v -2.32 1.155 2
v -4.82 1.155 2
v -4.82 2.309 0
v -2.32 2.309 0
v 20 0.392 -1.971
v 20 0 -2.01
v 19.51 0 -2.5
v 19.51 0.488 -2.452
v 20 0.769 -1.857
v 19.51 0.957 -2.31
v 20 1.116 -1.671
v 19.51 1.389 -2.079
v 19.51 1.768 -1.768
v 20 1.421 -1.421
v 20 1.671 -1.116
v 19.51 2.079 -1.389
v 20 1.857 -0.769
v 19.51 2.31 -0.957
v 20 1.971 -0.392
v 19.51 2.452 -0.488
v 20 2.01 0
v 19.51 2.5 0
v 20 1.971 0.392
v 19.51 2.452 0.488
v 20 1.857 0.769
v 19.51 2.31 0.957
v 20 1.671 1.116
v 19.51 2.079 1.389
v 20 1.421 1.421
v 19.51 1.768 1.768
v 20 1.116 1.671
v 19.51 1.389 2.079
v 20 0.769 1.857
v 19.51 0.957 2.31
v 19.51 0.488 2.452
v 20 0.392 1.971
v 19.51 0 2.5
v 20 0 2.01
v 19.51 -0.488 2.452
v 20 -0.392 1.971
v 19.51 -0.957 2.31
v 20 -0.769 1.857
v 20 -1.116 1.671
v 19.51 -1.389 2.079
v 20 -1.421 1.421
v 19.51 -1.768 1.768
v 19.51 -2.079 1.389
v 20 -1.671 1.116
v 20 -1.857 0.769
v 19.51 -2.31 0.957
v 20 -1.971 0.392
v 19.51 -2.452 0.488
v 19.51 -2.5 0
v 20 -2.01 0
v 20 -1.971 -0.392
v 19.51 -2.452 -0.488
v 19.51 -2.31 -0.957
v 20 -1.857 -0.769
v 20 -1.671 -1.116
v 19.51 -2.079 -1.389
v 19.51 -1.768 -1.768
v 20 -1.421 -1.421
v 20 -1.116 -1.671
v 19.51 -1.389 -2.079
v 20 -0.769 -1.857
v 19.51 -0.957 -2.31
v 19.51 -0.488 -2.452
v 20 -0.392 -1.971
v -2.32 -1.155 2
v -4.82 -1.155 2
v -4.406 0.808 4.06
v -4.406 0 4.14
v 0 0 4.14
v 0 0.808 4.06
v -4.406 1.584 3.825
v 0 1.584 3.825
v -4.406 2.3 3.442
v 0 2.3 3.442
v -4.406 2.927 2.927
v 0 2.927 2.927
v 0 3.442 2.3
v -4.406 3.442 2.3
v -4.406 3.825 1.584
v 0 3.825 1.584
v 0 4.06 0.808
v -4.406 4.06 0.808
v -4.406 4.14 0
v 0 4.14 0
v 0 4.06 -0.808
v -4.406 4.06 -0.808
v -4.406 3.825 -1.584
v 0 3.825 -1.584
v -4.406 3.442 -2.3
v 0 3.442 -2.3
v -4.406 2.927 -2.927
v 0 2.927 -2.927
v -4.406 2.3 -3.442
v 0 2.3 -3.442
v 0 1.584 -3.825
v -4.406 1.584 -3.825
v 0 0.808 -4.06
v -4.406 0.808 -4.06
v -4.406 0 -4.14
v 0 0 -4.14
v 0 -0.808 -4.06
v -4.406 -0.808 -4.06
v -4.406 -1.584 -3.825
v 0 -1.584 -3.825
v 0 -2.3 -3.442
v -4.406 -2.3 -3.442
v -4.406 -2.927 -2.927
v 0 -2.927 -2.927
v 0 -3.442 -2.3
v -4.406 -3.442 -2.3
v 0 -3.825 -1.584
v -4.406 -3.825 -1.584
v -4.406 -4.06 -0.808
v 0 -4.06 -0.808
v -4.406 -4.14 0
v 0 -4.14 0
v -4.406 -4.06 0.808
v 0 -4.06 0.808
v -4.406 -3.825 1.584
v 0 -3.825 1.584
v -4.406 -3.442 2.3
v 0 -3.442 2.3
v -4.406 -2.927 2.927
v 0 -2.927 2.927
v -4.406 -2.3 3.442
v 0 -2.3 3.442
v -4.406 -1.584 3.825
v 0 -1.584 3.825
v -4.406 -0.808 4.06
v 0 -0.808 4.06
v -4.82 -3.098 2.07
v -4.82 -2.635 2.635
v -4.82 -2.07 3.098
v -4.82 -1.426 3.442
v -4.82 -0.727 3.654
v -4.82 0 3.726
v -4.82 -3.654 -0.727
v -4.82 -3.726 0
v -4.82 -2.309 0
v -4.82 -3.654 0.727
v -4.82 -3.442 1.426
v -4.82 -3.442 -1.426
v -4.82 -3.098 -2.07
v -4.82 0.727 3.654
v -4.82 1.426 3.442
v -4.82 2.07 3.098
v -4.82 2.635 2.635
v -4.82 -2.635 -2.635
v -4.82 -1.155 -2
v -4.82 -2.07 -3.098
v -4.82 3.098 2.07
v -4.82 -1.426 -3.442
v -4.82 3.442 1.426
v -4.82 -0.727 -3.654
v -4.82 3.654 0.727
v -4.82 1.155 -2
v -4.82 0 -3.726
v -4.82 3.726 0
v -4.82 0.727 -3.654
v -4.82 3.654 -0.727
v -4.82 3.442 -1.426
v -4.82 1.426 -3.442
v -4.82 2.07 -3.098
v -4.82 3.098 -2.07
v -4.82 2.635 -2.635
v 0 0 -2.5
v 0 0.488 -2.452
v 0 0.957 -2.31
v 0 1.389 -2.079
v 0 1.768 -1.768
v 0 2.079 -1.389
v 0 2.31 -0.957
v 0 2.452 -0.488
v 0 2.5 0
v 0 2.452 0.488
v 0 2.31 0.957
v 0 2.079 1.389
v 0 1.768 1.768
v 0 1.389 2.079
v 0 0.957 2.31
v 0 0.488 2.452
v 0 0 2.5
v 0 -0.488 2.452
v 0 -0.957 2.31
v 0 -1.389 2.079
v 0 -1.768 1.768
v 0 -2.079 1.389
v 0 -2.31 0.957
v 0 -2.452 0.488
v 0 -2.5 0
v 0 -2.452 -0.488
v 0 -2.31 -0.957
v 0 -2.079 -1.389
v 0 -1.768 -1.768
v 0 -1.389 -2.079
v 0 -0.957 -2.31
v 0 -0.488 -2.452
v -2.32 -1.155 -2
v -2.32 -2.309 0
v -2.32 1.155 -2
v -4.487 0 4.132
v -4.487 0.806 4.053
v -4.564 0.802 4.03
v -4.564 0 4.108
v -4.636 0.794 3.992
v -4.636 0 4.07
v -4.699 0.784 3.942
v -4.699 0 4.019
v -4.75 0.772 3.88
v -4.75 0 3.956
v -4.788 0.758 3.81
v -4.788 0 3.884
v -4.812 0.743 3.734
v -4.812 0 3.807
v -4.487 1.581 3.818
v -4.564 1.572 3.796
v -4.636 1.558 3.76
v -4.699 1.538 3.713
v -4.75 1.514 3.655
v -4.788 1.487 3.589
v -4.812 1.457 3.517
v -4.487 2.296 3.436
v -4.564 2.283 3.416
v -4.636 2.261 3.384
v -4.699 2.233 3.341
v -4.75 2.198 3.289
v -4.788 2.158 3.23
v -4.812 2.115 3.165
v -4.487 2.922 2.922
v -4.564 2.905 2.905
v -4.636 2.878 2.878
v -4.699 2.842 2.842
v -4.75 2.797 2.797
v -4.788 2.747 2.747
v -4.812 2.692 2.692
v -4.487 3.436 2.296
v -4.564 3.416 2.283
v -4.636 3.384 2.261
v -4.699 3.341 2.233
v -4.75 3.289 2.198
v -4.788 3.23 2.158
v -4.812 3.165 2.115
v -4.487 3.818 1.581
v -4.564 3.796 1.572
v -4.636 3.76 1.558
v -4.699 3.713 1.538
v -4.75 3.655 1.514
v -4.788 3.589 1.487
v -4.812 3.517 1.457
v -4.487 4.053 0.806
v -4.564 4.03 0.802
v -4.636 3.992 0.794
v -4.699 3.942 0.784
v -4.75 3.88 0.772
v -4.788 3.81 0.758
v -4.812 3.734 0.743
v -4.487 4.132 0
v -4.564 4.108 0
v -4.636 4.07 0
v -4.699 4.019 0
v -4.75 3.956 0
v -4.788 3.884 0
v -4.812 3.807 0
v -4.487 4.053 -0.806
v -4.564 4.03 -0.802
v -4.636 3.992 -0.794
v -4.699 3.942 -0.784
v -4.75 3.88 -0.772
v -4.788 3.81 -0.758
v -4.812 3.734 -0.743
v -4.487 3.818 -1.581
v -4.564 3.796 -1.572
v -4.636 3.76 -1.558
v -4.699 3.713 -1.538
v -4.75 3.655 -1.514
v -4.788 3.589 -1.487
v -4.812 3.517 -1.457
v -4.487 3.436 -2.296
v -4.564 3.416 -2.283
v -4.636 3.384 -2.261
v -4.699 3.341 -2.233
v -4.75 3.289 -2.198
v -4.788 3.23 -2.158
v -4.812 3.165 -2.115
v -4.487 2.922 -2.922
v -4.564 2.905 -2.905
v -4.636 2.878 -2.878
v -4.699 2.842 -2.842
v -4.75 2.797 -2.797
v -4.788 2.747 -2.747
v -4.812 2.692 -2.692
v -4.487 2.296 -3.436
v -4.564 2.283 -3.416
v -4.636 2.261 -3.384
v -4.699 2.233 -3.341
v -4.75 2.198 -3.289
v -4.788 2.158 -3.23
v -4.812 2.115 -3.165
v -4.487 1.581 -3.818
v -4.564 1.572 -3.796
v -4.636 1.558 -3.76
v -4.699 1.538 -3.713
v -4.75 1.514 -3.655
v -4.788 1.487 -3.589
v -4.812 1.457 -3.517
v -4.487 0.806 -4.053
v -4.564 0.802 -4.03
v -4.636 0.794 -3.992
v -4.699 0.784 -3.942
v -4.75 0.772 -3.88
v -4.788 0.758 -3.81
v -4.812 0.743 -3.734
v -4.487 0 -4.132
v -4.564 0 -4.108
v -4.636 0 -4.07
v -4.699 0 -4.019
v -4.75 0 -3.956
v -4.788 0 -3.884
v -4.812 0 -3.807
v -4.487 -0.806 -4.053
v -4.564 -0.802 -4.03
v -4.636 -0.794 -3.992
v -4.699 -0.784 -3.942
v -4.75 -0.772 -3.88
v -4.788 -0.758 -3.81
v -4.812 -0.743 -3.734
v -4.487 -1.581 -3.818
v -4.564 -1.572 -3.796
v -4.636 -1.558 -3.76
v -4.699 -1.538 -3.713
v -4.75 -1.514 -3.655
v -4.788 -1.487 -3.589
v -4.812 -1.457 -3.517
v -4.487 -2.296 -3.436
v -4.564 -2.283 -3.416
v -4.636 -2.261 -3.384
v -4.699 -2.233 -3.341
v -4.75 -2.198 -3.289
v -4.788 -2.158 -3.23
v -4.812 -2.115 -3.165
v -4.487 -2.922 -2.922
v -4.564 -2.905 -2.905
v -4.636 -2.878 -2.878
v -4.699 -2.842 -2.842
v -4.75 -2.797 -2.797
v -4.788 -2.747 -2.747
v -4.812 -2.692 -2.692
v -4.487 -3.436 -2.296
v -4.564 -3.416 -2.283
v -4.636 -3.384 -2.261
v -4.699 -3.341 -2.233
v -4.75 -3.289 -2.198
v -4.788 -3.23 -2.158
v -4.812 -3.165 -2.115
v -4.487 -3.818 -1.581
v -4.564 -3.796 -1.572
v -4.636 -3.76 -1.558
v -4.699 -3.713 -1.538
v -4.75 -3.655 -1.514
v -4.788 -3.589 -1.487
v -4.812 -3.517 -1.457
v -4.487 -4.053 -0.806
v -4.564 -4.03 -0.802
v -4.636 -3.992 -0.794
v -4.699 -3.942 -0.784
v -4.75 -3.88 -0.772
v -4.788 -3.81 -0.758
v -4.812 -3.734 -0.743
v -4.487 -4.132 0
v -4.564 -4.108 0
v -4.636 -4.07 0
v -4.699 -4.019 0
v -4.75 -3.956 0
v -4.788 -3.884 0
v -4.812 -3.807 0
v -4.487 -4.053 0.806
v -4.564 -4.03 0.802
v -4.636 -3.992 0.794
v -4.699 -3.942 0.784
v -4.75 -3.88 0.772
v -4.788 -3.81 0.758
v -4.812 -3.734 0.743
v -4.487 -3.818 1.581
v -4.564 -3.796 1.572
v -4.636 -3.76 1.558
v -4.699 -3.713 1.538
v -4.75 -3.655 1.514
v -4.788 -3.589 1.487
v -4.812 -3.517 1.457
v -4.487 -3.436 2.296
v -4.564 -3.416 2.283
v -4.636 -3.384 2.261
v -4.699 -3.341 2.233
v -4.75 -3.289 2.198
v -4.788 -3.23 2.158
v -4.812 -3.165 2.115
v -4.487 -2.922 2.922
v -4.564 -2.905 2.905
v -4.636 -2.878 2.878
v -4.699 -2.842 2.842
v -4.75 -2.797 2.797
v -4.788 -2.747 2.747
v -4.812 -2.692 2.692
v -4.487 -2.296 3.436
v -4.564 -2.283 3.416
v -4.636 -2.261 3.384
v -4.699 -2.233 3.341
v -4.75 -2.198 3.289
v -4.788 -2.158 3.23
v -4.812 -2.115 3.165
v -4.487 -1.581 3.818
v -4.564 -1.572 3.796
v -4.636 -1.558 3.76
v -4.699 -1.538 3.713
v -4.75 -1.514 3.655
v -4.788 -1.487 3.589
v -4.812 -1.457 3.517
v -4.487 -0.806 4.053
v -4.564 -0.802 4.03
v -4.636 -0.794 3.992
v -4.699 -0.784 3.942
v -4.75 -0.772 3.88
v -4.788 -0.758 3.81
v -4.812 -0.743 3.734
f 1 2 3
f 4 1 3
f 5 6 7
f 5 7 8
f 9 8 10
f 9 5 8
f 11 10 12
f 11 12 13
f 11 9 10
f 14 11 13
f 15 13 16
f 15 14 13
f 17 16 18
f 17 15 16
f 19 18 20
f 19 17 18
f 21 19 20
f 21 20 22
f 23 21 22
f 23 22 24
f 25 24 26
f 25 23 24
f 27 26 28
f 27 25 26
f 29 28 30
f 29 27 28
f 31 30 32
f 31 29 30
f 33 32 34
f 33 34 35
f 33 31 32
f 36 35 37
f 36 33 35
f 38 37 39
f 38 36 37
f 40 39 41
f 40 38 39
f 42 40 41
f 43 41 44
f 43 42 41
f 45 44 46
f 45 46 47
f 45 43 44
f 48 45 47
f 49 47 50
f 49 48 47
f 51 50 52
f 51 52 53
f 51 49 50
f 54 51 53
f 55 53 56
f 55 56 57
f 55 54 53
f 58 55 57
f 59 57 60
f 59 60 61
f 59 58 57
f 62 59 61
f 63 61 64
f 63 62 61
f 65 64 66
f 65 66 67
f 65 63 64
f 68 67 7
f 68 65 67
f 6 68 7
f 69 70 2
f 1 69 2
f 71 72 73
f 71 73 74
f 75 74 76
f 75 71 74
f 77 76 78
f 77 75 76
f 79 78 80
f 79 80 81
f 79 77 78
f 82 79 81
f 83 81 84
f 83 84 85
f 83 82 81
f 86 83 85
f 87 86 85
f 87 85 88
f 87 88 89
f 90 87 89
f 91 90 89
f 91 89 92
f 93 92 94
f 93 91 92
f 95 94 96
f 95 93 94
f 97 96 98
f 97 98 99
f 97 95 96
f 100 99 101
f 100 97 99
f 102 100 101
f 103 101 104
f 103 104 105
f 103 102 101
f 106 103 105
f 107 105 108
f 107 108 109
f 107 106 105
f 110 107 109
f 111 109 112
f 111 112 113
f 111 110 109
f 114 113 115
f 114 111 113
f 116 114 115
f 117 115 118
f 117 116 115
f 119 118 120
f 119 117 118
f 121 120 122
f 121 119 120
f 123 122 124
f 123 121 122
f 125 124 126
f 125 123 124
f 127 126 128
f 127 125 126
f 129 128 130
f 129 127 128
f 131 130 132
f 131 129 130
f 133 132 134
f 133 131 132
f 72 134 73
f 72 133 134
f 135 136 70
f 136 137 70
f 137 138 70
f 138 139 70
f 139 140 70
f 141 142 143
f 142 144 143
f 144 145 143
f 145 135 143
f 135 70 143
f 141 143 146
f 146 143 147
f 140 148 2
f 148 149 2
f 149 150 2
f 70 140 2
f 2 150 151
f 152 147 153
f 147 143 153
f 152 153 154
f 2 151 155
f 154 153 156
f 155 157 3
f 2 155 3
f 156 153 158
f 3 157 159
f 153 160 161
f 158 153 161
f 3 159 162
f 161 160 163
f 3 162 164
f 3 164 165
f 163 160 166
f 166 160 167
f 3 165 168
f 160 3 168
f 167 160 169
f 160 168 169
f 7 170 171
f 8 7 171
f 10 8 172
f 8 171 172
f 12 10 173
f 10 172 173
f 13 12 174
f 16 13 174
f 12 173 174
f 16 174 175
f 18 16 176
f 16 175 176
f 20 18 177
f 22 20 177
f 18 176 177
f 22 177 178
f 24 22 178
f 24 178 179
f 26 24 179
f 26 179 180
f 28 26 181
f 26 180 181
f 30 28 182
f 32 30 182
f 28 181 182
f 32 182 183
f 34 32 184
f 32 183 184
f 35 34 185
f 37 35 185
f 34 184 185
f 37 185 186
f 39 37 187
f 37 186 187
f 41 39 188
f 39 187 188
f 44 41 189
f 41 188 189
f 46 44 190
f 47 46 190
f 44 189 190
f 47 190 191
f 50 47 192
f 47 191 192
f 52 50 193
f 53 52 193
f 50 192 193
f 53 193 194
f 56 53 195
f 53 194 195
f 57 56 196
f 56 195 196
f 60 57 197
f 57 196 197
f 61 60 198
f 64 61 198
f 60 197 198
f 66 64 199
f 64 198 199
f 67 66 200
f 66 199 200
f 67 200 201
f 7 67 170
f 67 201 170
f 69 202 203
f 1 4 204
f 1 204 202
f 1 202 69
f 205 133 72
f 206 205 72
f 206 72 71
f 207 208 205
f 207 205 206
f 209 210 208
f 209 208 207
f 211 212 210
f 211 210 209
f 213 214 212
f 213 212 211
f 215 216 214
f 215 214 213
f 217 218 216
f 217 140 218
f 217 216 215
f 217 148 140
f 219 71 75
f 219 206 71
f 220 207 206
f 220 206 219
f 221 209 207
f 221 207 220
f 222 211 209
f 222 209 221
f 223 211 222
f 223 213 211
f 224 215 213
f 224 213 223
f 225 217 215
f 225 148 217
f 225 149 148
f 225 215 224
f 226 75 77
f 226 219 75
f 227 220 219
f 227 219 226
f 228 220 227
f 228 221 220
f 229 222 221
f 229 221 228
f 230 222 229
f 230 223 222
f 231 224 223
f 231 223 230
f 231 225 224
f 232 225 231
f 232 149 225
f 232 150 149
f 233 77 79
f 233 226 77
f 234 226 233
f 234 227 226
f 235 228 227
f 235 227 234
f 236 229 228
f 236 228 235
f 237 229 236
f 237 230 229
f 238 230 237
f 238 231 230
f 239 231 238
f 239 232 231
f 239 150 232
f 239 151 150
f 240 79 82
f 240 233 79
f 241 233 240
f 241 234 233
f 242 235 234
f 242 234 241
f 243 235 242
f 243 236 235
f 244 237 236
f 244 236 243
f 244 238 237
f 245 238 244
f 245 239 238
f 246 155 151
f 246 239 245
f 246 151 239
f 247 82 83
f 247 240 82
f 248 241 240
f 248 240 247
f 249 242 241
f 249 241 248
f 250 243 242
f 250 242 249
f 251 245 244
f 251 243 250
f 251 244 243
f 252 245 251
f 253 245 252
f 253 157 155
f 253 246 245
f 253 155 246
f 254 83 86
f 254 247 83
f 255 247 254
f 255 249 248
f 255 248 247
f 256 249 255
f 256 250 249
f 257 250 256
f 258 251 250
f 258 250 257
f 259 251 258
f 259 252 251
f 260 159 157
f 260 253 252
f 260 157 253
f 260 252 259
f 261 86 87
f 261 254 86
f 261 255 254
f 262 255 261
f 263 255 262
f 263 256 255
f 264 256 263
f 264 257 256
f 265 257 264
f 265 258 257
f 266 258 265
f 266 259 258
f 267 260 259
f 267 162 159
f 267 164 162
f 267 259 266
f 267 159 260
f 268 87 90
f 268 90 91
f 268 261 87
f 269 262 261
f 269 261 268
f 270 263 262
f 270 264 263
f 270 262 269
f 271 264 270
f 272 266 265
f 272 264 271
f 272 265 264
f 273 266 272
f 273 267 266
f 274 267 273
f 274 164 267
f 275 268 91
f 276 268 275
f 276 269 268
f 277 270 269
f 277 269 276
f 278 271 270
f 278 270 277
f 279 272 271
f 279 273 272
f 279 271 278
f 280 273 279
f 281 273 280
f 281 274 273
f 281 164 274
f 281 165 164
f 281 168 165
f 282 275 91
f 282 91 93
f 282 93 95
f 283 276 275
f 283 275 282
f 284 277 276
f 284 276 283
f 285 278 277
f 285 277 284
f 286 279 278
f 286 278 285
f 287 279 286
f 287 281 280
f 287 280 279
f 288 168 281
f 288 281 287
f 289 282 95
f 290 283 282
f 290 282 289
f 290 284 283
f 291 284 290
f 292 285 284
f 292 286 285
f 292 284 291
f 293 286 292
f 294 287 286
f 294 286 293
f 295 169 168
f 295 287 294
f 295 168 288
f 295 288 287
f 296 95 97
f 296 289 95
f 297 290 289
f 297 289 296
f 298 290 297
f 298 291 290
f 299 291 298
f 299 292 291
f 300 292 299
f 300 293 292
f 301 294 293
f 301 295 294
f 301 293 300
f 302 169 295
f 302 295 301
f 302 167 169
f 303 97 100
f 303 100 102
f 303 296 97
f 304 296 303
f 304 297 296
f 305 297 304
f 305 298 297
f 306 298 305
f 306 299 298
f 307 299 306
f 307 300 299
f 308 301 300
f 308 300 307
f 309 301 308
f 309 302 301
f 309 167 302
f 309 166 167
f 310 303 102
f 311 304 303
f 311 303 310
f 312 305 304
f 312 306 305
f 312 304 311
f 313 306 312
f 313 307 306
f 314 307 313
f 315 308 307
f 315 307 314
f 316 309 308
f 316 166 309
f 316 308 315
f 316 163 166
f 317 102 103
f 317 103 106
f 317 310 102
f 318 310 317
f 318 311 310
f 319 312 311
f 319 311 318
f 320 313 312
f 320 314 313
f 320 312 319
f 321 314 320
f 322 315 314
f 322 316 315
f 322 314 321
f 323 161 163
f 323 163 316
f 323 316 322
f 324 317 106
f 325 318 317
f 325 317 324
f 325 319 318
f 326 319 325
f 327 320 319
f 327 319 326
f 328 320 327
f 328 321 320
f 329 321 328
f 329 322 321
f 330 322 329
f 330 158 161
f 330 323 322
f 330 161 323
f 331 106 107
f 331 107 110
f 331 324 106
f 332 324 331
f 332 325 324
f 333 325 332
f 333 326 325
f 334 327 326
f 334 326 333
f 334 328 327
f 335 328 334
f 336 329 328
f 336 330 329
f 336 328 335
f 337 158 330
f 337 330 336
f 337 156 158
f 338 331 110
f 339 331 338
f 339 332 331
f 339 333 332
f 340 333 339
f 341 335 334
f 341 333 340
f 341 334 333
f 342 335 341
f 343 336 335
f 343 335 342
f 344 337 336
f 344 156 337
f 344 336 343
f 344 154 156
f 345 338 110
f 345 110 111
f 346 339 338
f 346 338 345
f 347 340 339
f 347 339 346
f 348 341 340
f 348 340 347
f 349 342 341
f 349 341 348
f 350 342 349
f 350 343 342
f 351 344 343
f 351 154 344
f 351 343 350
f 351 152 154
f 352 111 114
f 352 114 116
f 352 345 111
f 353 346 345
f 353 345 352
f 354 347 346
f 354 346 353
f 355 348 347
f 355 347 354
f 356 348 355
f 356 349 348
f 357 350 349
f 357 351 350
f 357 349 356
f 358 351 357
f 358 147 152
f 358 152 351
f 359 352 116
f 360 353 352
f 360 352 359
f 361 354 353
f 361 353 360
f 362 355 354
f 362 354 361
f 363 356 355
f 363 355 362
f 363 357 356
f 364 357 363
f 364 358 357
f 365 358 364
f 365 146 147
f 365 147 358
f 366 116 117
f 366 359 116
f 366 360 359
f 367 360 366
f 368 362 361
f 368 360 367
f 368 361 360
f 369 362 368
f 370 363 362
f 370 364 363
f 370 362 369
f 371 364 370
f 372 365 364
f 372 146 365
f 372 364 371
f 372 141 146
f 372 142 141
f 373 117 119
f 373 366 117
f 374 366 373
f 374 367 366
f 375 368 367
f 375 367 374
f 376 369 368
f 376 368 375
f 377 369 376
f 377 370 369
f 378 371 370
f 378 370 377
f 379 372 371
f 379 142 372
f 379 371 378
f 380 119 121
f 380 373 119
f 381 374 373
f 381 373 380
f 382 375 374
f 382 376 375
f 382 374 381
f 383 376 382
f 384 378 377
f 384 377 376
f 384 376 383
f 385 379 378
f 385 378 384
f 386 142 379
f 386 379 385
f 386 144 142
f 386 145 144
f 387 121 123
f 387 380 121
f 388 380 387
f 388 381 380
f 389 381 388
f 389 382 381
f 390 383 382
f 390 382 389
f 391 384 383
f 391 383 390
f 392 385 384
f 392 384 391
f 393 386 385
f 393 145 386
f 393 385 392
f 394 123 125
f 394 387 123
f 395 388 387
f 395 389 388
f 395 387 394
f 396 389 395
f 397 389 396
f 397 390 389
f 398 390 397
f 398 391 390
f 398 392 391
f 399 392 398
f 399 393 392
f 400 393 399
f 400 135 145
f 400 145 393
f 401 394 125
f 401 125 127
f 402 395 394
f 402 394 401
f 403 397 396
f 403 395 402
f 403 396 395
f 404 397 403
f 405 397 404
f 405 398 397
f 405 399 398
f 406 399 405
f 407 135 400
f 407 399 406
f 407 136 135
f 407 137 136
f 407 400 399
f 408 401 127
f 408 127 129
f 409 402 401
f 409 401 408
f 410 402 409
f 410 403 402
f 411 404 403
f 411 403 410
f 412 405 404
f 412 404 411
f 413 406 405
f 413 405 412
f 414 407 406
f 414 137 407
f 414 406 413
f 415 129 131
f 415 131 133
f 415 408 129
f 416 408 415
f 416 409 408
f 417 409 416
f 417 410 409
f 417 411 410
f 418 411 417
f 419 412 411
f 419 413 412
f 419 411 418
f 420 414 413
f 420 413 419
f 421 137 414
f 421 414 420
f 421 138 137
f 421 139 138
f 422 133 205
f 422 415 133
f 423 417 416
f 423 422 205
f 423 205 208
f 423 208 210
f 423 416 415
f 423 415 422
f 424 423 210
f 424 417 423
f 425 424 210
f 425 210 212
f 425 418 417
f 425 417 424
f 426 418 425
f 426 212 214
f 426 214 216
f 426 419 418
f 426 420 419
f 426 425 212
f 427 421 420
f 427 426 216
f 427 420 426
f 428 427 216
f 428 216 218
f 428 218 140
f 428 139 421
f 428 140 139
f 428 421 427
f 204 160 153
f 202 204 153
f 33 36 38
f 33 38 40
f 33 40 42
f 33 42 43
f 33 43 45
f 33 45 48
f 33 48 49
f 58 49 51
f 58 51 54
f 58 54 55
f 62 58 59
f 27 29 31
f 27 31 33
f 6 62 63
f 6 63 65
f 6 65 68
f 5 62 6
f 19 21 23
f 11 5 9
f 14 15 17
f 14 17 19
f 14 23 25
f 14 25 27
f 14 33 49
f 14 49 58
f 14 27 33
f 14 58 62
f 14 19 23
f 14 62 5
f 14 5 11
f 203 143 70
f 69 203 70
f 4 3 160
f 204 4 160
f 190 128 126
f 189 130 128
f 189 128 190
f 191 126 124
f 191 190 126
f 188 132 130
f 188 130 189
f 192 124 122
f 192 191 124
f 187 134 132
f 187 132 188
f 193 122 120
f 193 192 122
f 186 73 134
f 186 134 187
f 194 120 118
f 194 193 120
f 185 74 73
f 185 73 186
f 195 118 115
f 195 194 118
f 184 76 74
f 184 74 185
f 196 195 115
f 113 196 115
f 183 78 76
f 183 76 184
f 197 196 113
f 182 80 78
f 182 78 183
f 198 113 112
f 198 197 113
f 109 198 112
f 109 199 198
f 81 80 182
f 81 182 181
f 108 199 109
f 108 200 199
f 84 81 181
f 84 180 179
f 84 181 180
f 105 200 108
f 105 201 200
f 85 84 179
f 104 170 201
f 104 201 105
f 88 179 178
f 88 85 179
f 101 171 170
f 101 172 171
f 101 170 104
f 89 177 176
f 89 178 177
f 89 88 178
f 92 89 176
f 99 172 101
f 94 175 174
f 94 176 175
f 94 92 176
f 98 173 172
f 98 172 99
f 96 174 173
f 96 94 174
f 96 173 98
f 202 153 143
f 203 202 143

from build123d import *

# Parameters (mm, degrees)
SKETCH1_W           = 4.82
SKETCH1_H           = 4.14
SKETCH2_R           = 2.5
BOSS_EXTRUDE1_DEPTH = 20
CUT_EXTRUDE1_DEPTH  = 2.5
CHAMFER1_SIZE       = 0.4905
FILLET1_R           = 0.414


with BuildPart() as part:
    # Sketch1 → Revolve1 (revolve)
    with BuildSketch(Plane(origin=(0, 0, 0), x_dir=(-1, 0, 0), z_dir=(0, 0, -1)), mode=Mode.PRIVATE) as revolve1_sk:
        with Locations((2.41, 2.07)):
            Rectangle(SKETCH1_W, SKETCH1_H)
    revolve(revolve1_sk.sketch.rotate(Axis((0, 0, 0), (-1, 0, 0)), 270), axis=Axis((0, 0, 0), (-1, 0, 0)))

    # Sketch2 → Boss-Extrude1 (add)
    with BuildSketch(Plane(origin=(0, 0, 0), x_dir=(0, 0, -1), z_dir=(1, 0, 0))):
        Circle(SKETCH2_R)
    extrude(amount=BOSS_EXTRUDE1_DEPTH)

    # Sketch3 → Cut-Extrude1 (cut)
    with BuildSketch(Plane.ZY.offset(4.82)):
        Polygon((-2, -1.154700538), (0, -2.309401077), (2, -1.154700538), (2, 1.154700538), (0, 2.309401077), (-2, 1.154700538), align=None)
    extrude(amount=-CUT_EXTRUDE1_DEPTH, mode=Mode.SUBTRACT)

    # Chamfer1
    chamfer1_edges = [part.edges().sort_by_distance(p)[0] for p in [
        (20, 0, 2.5),
    ]]
    chamfer(chamfer1_edges, length=CHAMFER1_SIZE)

    # Fillet1
    fillet1_edges = [part.edges().sort_by_distance(p)[0] for p in [
        (-4.82, 0, -4.14),
    ]]
    fillet(fillet1_edges, radius=FILLET1_R)


solid = part.part
